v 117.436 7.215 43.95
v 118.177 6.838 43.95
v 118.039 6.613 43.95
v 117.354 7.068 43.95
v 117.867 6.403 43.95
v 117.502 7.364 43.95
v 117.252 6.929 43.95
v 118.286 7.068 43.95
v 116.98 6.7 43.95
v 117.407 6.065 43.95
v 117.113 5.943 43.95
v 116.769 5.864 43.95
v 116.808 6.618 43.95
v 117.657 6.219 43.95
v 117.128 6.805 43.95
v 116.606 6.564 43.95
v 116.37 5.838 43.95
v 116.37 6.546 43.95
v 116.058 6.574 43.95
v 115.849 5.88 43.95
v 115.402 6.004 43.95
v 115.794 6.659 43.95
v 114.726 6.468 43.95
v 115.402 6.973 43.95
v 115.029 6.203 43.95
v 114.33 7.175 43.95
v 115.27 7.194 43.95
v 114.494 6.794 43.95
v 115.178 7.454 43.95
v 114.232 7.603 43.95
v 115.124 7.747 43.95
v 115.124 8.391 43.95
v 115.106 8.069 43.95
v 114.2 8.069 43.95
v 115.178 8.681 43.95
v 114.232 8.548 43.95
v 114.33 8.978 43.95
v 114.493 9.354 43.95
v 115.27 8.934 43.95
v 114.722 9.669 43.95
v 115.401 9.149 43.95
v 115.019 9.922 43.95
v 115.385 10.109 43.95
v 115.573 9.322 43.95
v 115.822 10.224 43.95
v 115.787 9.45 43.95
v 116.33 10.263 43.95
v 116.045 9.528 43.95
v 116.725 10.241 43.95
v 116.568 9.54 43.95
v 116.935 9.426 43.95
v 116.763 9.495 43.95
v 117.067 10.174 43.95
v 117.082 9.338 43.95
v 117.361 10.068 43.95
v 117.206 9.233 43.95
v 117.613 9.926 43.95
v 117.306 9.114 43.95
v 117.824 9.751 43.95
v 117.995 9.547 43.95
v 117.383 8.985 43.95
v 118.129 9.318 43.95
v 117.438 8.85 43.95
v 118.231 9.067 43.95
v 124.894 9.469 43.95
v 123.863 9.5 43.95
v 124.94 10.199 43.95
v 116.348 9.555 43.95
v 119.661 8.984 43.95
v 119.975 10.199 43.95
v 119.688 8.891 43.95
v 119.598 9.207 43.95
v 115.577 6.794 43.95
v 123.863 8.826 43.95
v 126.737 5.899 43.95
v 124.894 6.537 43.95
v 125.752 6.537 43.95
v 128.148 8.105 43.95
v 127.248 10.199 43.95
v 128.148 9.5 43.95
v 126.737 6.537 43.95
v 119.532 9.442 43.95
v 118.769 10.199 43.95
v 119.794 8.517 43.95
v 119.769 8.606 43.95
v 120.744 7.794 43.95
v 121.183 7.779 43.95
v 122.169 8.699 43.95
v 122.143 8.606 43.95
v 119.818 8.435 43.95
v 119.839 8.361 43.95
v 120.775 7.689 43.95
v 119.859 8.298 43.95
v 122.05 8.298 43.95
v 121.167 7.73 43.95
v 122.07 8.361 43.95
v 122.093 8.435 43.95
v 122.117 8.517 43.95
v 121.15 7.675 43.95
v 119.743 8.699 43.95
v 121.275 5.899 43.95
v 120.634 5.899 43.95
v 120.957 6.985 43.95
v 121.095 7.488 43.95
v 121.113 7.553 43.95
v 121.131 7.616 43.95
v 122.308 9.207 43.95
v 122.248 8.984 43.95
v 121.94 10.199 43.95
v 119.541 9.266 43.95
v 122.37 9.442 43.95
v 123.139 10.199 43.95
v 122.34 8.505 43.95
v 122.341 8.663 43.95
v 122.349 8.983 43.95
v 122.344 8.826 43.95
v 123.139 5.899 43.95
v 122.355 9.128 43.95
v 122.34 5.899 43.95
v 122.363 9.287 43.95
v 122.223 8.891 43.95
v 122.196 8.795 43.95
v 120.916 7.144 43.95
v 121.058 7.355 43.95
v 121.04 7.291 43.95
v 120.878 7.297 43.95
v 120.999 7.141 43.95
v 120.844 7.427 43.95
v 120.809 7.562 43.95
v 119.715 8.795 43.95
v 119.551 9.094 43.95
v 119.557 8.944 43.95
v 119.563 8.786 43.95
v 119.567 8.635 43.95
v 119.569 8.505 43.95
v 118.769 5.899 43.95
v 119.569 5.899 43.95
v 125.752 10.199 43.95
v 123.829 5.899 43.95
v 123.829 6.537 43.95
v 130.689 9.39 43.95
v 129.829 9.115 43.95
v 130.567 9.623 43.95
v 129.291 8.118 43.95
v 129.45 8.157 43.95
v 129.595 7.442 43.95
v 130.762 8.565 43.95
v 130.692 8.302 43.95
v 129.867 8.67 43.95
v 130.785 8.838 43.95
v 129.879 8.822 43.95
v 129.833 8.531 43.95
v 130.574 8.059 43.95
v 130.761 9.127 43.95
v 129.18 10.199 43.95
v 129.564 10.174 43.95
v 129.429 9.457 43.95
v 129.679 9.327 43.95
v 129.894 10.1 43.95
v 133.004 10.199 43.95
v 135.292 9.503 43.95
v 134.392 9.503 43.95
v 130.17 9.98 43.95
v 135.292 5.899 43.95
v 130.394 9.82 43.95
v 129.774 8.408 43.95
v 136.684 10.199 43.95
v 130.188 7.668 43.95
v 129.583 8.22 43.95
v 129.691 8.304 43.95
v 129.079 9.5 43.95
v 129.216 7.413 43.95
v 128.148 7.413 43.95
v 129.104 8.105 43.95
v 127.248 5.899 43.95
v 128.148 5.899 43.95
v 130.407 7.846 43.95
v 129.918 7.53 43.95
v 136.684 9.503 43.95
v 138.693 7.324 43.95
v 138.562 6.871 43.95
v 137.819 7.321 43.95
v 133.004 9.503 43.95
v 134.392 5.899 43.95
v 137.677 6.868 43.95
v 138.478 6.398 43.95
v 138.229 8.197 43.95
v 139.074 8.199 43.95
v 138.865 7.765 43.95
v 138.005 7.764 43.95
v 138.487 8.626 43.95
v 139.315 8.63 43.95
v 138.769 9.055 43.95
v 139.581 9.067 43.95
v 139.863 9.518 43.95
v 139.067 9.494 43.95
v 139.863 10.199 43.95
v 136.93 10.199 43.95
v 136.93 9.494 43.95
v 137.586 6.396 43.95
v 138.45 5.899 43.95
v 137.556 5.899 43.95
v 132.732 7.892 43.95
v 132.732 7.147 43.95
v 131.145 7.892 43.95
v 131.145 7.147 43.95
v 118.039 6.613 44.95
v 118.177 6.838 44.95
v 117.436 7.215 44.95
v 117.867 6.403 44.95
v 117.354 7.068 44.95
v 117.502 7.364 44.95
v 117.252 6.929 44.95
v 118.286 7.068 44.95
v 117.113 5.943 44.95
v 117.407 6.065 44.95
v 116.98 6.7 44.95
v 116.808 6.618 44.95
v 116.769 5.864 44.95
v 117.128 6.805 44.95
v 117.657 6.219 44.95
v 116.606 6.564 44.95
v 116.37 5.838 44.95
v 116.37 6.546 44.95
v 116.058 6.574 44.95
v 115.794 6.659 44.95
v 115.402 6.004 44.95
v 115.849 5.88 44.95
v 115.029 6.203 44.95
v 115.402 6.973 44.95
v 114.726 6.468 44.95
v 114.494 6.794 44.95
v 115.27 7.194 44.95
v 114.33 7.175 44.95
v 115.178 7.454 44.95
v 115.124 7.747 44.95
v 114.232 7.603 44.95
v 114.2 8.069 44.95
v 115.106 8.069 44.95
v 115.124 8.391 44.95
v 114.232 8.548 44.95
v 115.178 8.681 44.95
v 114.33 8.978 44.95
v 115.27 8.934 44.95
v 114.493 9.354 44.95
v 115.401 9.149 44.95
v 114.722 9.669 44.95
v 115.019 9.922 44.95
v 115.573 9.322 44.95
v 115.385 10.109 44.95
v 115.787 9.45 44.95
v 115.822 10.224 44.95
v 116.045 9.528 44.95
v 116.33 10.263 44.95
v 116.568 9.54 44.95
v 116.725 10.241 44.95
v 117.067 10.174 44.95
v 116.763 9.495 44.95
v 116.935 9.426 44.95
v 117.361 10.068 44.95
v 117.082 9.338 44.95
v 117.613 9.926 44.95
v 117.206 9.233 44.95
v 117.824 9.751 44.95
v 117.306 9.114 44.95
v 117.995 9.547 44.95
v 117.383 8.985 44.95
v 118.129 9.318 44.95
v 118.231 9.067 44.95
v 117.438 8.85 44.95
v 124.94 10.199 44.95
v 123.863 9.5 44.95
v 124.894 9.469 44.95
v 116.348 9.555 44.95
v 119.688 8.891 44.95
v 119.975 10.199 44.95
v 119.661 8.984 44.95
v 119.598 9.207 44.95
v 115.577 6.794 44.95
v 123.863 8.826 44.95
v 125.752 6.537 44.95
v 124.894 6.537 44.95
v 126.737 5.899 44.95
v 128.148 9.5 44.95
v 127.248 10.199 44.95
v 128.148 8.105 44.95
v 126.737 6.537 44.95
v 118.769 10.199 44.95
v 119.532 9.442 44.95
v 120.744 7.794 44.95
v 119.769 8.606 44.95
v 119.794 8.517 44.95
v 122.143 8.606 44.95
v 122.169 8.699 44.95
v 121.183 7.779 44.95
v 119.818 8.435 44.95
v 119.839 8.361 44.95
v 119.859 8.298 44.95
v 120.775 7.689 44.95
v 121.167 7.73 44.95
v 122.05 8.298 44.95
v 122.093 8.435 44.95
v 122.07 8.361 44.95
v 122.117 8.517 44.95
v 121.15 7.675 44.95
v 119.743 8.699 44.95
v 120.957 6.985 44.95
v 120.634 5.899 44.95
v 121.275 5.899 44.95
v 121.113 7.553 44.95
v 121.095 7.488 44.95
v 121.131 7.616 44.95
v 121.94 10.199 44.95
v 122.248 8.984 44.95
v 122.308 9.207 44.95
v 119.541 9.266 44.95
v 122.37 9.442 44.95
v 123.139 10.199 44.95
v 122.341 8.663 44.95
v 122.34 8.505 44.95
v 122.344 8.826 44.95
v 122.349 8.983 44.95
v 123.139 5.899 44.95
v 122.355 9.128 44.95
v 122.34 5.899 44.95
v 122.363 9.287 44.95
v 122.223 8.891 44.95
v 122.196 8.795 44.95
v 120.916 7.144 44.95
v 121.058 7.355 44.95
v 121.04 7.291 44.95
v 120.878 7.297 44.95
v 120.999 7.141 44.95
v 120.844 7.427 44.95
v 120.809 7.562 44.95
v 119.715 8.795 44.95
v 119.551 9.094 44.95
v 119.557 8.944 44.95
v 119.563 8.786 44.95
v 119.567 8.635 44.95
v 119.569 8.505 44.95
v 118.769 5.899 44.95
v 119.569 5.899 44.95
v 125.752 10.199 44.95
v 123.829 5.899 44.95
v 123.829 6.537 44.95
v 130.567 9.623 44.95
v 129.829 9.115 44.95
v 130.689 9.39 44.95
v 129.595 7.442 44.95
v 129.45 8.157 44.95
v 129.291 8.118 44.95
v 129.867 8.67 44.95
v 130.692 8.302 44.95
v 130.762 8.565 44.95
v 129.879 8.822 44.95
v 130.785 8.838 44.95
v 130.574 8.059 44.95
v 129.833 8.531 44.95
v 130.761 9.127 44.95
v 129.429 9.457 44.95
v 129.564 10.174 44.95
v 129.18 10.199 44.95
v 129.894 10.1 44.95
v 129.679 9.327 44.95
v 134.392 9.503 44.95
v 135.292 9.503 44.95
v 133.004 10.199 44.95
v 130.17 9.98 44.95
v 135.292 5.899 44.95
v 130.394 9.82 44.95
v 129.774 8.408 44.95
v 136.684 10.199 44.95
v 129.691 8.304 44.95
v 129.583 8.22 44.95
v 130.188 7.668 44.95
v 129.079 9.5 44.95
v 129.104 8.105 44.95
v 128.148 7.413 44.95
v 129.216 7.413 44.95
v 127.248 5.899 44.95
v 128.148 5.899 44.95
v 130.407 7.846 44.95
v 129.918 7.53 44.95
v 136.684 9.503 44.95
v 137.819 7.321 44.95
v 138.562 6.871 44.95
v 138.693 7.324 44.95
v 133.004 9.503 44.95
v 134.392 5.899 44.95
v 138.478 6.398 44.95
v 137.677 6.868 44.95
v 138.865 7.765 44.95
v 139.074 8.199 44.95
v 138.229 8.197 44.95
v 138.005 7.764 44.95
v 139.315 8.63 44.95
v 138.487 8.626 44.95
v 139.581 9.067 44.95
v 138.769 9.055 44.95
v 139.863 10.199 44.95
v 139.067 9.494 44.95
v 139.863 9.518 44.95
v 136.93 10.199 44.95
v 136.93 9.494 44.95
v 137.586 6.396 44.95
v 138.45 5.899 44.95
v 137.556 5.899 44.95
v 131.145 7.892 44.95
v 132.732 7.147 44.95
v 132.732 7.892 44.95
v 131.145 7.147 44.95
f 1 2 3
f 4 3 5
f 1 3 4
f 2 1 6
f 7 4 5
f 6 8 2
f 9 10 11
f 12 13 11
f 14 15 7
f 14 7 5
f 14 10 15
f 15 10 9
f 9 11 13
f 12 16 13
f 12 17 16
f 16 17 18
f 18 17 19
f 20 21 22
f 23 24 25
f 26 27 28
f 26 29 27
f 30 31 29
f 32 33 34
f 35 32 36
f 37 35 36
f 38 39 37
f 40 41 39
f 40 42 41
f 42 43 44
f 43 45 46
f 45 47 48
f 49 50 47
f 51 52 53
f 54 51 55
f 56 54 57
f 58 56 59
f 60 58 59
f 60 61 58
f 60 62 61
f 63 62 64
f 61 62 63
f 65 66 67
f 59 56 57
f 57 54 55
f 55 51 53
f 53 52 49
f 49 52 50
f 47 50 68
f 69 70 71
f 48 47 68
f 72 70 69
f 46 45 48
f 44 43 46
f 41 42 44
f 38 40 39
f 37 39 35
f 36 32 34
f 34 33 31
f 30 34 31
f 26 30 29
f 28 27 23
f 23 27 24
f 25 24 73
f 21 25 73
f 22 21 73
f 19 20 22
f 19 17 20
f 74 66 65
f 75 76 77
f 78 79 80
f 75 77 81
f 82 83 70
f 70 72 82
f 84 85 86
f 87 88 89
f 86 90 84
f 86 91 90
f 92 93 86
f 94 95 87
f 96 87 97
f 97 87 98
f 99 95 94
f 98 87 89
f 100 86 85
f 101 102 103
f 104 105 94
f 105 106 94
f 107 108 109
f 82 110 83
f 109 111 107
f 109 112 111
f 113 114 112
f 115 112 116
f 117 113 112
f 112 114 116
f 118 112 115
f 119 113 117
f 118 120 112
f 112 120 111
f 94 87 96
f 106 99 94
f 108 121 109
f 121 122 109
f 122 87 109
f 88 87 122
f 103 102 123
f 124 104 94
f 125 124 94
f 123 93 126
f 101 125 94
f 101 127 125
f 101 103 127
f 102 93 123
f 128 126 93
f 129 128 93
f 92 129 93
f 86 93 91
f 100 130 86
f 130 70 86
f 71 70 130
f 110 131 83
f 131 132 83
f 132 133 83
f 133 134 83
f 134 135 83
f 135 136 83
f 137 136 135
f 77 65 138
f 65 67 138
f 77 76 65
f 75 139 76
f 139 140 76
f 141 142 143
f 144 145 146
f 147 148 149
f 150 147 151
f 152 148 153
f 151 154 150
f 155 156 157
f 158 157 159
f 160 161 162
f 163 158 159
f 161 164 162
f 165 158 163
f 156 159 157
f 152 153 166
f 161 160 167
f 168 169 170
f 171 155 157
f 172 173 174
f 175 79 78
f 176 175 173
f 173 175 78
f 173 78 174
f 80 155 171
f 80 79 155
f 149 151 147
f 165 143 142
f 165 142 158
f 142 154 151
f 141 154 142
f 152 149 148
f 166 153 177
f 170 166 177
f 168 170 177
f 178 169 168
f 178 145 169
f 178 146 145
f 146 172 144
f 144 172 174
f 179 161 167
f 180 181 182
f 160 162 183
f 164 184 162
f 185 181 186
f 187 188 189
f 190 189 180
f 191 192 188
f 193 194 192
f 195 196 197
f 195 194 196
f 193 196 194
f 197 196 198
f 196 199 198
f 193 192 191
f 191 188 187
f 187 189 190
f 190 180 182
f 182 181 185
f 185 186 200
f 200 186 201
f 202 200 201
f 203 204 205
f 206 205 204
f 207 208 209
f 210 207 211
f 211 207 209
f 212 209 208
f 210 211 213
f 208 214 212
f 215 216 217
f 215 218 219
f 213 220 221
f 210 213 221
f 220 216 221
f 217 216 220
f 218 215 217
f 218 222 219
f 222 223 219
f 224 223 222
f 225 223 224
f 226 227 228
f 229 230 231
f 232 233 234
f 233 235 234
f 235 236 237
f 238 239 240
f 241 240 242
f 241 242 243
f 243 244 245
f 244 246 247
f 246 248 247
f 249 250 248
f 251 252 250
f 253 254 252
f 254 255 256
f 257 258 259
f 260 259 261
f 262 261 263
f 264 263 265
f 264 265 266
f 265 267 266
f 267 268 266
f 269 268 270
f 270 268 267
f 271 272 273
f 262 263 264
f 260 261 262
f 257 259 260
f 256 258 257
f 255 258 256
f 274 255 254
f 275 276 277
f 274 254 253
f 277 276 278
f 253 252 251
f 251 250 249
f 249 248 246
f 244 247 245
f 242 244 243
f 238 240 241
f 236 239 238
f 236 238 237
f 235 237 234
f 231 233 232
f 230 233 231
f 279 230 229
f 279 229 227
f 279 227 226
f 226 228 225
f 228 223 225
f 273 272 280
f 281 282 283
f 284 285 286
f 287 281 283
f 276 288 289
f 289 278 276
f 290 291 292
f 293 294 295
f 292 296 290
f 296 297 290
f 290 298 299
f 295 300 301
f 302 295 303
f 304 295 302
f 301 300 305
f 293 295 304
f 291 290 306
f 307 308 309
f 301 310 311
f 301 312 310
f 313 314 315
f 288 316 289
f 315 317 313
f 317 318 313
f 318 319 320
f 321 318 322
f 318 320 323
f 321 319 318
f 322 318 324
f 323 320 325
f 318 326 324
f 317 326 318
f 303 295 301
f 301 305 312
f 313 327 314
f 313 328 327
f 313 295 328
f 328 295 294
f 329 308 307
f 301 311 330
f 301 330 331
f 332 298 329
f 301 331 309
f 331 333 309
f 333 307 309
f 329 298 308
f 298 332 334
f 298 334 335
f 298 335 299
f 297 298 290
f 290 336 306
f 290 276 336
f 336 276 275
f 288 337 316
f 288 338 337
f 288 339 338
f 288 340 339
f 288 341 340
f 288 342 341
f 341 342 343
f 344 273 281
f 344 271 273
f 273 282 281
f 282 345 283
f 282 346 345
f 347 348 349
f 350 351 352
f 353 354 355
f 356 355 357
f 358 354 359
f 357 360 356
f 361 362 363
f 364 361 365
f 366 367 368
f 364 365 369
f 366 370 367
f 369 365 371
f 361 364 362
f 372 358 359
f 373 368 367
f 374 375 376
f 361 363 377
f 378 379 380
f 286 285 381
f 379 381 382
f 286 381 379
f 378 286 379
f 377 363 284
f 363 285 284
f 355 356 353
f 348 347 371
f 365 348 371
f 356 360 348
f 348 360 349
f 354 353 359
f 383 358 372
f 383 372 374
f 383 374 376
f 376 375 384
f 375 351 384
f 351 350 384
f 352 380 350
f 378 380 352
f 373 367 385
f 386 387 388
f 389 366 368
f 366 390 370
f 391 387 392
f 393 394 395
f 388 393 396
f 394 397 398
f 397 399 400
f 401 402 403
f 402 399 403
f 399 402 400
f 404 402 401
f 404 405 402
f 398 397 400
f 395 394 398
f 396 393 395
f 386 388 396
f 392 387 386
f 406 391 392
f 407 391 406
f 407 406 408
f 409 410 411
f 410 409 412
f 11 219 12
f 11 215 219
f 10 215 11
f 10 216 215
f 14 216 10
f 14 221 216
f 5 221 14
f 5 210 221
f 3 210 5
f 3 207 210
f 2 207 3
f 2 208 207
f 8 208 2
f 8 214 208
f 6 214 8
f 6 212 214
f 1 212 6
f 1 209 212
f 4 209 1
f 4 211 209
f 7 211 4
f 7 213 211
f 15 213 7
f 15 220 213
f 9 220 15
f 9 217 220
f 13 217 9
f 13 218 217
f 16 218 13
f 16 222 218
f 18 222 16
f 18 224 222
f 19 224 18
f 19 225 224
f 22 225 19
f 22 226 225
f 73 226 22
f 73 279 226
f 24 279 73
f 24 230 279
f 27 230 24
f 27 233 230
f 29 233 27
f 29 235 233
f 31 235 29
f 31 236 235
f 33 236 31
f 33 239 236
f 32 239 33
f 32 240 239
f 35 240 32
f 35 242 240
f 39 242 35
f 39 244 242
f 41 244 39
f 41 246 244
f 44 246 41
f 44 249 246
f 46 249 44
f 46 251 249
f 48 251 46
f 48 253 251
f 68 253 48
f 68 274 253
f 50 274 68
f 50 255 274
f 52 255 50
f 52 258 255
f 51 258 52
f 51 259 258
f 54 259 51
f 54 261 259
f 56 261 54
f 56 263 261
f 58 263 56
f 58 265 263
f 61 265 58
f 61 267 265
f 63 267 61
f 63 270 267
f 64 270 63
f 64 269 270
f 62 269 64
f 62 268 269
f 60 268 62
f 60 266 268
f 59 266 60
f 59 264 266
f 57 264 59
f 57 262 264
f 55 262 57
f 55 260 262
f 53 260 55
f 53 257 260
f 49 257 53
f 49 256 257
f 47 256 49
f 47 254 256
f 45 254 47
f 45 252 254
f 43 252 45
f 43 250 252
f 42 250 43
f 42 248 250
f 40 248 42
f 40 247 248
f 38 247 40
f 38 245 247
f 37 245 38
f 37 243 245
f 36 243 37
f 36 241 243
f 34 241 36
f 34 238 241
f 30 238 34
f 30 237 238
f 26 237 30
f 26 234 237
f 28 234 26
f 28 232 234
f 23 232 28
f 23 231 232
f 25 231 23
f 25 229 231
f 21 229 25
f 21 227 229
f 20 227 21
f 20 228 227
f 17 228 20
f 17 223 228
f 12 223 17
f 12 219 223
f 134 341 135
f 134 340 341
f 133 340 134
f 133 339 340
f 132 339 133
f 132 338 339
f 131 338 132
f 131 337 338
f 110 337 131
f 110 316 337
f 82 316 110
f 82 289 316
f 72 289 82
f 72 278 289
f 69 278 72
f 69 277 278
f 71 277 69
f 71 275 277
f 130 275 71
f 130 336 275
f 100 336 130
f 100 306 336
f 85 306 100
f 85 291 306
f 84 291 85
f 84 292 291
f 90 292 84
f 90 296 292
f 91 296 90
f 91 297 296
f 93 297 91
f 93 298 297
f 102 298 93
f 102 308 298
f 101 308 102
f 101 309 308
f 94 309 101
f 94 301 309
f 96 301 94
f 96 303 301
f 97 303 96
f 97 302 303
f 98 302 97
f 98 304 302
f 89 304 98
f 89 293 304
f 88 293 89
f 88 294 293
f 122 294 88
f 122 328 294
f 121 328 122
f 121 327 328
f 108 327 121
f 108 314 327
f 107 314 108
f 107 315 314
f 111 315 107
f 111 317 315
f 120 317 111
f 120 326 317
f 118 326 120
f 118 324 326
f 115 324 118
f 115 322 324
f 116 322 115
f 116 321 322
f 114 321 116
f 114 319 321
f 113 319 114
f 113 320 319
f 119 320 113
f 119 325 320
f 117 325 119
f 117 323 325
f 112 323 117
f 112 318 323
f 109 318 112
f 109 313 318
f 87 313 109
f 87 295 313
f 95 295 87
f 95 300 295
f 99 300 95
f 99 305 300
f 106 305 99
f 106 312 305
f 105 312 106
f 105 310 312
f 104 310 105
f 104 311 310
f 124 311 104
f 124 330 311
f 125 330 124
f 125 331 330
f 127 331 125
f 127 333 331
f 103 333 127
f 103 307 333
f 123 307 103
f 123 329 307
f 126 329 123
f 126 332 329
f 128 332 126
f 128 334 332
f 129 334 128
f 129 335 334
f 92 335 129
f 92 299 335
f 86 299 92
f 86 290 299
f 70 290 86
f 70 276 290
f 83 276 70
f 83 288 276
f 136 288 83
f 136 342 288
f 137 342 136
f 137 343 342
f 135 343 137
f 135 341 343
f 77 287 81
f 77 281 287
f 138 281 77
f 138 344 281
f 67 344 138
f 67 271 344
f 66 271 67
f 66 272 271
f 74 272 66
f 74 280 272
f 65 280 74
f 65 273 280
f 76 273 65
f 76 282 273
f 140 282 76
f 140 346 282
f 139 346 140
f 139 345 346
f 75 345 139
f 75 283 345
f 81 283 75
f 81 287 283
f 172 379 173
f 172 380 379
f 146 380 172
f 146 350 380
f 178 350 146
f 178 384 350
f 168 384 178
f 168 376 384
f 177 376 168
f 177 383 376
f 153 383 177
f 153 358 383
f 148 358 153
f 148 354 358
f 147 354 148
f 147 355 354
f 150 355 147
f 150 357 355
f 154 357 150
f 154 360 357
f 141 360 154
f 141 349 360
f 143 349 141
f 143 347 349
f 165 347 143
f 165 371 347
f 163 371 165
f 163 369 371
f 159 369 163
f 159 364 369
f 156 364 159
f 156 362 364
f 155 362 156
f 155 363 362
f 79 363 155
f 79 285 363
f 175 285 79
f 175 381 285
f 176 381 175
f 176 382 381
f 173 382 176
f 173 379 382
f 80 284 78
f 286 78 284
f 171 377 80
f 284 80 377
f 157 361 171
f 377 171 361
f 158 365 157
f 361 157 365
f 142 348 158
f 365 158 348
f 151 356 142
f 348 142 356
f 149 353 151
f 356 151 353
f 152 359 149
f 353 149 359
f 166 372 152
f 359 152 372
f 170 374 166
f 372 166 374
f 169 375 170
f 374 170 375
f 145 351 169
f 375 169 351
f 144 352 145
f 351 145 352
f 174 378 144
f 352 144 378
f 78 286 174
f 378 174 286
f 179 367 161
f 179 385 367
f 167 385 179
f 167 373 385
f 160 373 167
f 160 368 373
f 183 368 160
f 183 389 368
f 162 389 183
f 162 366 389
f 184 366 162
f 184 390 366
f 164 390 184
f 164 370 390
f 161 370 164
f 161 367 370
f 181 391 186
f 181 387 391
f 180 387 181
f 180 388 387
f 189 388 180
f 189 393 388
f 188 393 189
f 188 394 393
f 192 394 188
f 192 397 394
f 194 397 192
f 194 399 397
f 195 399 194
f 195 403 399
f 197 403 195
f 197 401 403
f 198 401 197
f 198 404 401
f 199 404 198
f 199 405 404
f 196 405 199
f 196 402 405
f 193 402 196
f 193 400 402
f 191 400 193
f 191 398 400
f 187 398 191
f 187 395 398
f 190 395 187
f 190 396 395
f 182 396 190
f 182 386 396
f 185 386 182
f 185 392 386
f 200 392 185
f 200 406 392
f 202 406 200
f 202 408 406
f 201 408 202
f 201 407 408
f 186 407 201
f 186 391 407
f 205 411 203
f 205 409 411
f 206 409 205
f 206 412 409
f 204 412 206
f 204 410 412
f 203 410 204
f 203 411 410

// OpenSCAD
// CM1P-T7 ID text, engraved 0.5 into the plate's top face (frame as cm1p_t7_freecad.py).
translate([127, 8, 43.95]) linear_extrude(1) text("CM1P-T7", size = 4.5, font = "Liberation Sans:style=Bold", halign = "center", valign = "center");
